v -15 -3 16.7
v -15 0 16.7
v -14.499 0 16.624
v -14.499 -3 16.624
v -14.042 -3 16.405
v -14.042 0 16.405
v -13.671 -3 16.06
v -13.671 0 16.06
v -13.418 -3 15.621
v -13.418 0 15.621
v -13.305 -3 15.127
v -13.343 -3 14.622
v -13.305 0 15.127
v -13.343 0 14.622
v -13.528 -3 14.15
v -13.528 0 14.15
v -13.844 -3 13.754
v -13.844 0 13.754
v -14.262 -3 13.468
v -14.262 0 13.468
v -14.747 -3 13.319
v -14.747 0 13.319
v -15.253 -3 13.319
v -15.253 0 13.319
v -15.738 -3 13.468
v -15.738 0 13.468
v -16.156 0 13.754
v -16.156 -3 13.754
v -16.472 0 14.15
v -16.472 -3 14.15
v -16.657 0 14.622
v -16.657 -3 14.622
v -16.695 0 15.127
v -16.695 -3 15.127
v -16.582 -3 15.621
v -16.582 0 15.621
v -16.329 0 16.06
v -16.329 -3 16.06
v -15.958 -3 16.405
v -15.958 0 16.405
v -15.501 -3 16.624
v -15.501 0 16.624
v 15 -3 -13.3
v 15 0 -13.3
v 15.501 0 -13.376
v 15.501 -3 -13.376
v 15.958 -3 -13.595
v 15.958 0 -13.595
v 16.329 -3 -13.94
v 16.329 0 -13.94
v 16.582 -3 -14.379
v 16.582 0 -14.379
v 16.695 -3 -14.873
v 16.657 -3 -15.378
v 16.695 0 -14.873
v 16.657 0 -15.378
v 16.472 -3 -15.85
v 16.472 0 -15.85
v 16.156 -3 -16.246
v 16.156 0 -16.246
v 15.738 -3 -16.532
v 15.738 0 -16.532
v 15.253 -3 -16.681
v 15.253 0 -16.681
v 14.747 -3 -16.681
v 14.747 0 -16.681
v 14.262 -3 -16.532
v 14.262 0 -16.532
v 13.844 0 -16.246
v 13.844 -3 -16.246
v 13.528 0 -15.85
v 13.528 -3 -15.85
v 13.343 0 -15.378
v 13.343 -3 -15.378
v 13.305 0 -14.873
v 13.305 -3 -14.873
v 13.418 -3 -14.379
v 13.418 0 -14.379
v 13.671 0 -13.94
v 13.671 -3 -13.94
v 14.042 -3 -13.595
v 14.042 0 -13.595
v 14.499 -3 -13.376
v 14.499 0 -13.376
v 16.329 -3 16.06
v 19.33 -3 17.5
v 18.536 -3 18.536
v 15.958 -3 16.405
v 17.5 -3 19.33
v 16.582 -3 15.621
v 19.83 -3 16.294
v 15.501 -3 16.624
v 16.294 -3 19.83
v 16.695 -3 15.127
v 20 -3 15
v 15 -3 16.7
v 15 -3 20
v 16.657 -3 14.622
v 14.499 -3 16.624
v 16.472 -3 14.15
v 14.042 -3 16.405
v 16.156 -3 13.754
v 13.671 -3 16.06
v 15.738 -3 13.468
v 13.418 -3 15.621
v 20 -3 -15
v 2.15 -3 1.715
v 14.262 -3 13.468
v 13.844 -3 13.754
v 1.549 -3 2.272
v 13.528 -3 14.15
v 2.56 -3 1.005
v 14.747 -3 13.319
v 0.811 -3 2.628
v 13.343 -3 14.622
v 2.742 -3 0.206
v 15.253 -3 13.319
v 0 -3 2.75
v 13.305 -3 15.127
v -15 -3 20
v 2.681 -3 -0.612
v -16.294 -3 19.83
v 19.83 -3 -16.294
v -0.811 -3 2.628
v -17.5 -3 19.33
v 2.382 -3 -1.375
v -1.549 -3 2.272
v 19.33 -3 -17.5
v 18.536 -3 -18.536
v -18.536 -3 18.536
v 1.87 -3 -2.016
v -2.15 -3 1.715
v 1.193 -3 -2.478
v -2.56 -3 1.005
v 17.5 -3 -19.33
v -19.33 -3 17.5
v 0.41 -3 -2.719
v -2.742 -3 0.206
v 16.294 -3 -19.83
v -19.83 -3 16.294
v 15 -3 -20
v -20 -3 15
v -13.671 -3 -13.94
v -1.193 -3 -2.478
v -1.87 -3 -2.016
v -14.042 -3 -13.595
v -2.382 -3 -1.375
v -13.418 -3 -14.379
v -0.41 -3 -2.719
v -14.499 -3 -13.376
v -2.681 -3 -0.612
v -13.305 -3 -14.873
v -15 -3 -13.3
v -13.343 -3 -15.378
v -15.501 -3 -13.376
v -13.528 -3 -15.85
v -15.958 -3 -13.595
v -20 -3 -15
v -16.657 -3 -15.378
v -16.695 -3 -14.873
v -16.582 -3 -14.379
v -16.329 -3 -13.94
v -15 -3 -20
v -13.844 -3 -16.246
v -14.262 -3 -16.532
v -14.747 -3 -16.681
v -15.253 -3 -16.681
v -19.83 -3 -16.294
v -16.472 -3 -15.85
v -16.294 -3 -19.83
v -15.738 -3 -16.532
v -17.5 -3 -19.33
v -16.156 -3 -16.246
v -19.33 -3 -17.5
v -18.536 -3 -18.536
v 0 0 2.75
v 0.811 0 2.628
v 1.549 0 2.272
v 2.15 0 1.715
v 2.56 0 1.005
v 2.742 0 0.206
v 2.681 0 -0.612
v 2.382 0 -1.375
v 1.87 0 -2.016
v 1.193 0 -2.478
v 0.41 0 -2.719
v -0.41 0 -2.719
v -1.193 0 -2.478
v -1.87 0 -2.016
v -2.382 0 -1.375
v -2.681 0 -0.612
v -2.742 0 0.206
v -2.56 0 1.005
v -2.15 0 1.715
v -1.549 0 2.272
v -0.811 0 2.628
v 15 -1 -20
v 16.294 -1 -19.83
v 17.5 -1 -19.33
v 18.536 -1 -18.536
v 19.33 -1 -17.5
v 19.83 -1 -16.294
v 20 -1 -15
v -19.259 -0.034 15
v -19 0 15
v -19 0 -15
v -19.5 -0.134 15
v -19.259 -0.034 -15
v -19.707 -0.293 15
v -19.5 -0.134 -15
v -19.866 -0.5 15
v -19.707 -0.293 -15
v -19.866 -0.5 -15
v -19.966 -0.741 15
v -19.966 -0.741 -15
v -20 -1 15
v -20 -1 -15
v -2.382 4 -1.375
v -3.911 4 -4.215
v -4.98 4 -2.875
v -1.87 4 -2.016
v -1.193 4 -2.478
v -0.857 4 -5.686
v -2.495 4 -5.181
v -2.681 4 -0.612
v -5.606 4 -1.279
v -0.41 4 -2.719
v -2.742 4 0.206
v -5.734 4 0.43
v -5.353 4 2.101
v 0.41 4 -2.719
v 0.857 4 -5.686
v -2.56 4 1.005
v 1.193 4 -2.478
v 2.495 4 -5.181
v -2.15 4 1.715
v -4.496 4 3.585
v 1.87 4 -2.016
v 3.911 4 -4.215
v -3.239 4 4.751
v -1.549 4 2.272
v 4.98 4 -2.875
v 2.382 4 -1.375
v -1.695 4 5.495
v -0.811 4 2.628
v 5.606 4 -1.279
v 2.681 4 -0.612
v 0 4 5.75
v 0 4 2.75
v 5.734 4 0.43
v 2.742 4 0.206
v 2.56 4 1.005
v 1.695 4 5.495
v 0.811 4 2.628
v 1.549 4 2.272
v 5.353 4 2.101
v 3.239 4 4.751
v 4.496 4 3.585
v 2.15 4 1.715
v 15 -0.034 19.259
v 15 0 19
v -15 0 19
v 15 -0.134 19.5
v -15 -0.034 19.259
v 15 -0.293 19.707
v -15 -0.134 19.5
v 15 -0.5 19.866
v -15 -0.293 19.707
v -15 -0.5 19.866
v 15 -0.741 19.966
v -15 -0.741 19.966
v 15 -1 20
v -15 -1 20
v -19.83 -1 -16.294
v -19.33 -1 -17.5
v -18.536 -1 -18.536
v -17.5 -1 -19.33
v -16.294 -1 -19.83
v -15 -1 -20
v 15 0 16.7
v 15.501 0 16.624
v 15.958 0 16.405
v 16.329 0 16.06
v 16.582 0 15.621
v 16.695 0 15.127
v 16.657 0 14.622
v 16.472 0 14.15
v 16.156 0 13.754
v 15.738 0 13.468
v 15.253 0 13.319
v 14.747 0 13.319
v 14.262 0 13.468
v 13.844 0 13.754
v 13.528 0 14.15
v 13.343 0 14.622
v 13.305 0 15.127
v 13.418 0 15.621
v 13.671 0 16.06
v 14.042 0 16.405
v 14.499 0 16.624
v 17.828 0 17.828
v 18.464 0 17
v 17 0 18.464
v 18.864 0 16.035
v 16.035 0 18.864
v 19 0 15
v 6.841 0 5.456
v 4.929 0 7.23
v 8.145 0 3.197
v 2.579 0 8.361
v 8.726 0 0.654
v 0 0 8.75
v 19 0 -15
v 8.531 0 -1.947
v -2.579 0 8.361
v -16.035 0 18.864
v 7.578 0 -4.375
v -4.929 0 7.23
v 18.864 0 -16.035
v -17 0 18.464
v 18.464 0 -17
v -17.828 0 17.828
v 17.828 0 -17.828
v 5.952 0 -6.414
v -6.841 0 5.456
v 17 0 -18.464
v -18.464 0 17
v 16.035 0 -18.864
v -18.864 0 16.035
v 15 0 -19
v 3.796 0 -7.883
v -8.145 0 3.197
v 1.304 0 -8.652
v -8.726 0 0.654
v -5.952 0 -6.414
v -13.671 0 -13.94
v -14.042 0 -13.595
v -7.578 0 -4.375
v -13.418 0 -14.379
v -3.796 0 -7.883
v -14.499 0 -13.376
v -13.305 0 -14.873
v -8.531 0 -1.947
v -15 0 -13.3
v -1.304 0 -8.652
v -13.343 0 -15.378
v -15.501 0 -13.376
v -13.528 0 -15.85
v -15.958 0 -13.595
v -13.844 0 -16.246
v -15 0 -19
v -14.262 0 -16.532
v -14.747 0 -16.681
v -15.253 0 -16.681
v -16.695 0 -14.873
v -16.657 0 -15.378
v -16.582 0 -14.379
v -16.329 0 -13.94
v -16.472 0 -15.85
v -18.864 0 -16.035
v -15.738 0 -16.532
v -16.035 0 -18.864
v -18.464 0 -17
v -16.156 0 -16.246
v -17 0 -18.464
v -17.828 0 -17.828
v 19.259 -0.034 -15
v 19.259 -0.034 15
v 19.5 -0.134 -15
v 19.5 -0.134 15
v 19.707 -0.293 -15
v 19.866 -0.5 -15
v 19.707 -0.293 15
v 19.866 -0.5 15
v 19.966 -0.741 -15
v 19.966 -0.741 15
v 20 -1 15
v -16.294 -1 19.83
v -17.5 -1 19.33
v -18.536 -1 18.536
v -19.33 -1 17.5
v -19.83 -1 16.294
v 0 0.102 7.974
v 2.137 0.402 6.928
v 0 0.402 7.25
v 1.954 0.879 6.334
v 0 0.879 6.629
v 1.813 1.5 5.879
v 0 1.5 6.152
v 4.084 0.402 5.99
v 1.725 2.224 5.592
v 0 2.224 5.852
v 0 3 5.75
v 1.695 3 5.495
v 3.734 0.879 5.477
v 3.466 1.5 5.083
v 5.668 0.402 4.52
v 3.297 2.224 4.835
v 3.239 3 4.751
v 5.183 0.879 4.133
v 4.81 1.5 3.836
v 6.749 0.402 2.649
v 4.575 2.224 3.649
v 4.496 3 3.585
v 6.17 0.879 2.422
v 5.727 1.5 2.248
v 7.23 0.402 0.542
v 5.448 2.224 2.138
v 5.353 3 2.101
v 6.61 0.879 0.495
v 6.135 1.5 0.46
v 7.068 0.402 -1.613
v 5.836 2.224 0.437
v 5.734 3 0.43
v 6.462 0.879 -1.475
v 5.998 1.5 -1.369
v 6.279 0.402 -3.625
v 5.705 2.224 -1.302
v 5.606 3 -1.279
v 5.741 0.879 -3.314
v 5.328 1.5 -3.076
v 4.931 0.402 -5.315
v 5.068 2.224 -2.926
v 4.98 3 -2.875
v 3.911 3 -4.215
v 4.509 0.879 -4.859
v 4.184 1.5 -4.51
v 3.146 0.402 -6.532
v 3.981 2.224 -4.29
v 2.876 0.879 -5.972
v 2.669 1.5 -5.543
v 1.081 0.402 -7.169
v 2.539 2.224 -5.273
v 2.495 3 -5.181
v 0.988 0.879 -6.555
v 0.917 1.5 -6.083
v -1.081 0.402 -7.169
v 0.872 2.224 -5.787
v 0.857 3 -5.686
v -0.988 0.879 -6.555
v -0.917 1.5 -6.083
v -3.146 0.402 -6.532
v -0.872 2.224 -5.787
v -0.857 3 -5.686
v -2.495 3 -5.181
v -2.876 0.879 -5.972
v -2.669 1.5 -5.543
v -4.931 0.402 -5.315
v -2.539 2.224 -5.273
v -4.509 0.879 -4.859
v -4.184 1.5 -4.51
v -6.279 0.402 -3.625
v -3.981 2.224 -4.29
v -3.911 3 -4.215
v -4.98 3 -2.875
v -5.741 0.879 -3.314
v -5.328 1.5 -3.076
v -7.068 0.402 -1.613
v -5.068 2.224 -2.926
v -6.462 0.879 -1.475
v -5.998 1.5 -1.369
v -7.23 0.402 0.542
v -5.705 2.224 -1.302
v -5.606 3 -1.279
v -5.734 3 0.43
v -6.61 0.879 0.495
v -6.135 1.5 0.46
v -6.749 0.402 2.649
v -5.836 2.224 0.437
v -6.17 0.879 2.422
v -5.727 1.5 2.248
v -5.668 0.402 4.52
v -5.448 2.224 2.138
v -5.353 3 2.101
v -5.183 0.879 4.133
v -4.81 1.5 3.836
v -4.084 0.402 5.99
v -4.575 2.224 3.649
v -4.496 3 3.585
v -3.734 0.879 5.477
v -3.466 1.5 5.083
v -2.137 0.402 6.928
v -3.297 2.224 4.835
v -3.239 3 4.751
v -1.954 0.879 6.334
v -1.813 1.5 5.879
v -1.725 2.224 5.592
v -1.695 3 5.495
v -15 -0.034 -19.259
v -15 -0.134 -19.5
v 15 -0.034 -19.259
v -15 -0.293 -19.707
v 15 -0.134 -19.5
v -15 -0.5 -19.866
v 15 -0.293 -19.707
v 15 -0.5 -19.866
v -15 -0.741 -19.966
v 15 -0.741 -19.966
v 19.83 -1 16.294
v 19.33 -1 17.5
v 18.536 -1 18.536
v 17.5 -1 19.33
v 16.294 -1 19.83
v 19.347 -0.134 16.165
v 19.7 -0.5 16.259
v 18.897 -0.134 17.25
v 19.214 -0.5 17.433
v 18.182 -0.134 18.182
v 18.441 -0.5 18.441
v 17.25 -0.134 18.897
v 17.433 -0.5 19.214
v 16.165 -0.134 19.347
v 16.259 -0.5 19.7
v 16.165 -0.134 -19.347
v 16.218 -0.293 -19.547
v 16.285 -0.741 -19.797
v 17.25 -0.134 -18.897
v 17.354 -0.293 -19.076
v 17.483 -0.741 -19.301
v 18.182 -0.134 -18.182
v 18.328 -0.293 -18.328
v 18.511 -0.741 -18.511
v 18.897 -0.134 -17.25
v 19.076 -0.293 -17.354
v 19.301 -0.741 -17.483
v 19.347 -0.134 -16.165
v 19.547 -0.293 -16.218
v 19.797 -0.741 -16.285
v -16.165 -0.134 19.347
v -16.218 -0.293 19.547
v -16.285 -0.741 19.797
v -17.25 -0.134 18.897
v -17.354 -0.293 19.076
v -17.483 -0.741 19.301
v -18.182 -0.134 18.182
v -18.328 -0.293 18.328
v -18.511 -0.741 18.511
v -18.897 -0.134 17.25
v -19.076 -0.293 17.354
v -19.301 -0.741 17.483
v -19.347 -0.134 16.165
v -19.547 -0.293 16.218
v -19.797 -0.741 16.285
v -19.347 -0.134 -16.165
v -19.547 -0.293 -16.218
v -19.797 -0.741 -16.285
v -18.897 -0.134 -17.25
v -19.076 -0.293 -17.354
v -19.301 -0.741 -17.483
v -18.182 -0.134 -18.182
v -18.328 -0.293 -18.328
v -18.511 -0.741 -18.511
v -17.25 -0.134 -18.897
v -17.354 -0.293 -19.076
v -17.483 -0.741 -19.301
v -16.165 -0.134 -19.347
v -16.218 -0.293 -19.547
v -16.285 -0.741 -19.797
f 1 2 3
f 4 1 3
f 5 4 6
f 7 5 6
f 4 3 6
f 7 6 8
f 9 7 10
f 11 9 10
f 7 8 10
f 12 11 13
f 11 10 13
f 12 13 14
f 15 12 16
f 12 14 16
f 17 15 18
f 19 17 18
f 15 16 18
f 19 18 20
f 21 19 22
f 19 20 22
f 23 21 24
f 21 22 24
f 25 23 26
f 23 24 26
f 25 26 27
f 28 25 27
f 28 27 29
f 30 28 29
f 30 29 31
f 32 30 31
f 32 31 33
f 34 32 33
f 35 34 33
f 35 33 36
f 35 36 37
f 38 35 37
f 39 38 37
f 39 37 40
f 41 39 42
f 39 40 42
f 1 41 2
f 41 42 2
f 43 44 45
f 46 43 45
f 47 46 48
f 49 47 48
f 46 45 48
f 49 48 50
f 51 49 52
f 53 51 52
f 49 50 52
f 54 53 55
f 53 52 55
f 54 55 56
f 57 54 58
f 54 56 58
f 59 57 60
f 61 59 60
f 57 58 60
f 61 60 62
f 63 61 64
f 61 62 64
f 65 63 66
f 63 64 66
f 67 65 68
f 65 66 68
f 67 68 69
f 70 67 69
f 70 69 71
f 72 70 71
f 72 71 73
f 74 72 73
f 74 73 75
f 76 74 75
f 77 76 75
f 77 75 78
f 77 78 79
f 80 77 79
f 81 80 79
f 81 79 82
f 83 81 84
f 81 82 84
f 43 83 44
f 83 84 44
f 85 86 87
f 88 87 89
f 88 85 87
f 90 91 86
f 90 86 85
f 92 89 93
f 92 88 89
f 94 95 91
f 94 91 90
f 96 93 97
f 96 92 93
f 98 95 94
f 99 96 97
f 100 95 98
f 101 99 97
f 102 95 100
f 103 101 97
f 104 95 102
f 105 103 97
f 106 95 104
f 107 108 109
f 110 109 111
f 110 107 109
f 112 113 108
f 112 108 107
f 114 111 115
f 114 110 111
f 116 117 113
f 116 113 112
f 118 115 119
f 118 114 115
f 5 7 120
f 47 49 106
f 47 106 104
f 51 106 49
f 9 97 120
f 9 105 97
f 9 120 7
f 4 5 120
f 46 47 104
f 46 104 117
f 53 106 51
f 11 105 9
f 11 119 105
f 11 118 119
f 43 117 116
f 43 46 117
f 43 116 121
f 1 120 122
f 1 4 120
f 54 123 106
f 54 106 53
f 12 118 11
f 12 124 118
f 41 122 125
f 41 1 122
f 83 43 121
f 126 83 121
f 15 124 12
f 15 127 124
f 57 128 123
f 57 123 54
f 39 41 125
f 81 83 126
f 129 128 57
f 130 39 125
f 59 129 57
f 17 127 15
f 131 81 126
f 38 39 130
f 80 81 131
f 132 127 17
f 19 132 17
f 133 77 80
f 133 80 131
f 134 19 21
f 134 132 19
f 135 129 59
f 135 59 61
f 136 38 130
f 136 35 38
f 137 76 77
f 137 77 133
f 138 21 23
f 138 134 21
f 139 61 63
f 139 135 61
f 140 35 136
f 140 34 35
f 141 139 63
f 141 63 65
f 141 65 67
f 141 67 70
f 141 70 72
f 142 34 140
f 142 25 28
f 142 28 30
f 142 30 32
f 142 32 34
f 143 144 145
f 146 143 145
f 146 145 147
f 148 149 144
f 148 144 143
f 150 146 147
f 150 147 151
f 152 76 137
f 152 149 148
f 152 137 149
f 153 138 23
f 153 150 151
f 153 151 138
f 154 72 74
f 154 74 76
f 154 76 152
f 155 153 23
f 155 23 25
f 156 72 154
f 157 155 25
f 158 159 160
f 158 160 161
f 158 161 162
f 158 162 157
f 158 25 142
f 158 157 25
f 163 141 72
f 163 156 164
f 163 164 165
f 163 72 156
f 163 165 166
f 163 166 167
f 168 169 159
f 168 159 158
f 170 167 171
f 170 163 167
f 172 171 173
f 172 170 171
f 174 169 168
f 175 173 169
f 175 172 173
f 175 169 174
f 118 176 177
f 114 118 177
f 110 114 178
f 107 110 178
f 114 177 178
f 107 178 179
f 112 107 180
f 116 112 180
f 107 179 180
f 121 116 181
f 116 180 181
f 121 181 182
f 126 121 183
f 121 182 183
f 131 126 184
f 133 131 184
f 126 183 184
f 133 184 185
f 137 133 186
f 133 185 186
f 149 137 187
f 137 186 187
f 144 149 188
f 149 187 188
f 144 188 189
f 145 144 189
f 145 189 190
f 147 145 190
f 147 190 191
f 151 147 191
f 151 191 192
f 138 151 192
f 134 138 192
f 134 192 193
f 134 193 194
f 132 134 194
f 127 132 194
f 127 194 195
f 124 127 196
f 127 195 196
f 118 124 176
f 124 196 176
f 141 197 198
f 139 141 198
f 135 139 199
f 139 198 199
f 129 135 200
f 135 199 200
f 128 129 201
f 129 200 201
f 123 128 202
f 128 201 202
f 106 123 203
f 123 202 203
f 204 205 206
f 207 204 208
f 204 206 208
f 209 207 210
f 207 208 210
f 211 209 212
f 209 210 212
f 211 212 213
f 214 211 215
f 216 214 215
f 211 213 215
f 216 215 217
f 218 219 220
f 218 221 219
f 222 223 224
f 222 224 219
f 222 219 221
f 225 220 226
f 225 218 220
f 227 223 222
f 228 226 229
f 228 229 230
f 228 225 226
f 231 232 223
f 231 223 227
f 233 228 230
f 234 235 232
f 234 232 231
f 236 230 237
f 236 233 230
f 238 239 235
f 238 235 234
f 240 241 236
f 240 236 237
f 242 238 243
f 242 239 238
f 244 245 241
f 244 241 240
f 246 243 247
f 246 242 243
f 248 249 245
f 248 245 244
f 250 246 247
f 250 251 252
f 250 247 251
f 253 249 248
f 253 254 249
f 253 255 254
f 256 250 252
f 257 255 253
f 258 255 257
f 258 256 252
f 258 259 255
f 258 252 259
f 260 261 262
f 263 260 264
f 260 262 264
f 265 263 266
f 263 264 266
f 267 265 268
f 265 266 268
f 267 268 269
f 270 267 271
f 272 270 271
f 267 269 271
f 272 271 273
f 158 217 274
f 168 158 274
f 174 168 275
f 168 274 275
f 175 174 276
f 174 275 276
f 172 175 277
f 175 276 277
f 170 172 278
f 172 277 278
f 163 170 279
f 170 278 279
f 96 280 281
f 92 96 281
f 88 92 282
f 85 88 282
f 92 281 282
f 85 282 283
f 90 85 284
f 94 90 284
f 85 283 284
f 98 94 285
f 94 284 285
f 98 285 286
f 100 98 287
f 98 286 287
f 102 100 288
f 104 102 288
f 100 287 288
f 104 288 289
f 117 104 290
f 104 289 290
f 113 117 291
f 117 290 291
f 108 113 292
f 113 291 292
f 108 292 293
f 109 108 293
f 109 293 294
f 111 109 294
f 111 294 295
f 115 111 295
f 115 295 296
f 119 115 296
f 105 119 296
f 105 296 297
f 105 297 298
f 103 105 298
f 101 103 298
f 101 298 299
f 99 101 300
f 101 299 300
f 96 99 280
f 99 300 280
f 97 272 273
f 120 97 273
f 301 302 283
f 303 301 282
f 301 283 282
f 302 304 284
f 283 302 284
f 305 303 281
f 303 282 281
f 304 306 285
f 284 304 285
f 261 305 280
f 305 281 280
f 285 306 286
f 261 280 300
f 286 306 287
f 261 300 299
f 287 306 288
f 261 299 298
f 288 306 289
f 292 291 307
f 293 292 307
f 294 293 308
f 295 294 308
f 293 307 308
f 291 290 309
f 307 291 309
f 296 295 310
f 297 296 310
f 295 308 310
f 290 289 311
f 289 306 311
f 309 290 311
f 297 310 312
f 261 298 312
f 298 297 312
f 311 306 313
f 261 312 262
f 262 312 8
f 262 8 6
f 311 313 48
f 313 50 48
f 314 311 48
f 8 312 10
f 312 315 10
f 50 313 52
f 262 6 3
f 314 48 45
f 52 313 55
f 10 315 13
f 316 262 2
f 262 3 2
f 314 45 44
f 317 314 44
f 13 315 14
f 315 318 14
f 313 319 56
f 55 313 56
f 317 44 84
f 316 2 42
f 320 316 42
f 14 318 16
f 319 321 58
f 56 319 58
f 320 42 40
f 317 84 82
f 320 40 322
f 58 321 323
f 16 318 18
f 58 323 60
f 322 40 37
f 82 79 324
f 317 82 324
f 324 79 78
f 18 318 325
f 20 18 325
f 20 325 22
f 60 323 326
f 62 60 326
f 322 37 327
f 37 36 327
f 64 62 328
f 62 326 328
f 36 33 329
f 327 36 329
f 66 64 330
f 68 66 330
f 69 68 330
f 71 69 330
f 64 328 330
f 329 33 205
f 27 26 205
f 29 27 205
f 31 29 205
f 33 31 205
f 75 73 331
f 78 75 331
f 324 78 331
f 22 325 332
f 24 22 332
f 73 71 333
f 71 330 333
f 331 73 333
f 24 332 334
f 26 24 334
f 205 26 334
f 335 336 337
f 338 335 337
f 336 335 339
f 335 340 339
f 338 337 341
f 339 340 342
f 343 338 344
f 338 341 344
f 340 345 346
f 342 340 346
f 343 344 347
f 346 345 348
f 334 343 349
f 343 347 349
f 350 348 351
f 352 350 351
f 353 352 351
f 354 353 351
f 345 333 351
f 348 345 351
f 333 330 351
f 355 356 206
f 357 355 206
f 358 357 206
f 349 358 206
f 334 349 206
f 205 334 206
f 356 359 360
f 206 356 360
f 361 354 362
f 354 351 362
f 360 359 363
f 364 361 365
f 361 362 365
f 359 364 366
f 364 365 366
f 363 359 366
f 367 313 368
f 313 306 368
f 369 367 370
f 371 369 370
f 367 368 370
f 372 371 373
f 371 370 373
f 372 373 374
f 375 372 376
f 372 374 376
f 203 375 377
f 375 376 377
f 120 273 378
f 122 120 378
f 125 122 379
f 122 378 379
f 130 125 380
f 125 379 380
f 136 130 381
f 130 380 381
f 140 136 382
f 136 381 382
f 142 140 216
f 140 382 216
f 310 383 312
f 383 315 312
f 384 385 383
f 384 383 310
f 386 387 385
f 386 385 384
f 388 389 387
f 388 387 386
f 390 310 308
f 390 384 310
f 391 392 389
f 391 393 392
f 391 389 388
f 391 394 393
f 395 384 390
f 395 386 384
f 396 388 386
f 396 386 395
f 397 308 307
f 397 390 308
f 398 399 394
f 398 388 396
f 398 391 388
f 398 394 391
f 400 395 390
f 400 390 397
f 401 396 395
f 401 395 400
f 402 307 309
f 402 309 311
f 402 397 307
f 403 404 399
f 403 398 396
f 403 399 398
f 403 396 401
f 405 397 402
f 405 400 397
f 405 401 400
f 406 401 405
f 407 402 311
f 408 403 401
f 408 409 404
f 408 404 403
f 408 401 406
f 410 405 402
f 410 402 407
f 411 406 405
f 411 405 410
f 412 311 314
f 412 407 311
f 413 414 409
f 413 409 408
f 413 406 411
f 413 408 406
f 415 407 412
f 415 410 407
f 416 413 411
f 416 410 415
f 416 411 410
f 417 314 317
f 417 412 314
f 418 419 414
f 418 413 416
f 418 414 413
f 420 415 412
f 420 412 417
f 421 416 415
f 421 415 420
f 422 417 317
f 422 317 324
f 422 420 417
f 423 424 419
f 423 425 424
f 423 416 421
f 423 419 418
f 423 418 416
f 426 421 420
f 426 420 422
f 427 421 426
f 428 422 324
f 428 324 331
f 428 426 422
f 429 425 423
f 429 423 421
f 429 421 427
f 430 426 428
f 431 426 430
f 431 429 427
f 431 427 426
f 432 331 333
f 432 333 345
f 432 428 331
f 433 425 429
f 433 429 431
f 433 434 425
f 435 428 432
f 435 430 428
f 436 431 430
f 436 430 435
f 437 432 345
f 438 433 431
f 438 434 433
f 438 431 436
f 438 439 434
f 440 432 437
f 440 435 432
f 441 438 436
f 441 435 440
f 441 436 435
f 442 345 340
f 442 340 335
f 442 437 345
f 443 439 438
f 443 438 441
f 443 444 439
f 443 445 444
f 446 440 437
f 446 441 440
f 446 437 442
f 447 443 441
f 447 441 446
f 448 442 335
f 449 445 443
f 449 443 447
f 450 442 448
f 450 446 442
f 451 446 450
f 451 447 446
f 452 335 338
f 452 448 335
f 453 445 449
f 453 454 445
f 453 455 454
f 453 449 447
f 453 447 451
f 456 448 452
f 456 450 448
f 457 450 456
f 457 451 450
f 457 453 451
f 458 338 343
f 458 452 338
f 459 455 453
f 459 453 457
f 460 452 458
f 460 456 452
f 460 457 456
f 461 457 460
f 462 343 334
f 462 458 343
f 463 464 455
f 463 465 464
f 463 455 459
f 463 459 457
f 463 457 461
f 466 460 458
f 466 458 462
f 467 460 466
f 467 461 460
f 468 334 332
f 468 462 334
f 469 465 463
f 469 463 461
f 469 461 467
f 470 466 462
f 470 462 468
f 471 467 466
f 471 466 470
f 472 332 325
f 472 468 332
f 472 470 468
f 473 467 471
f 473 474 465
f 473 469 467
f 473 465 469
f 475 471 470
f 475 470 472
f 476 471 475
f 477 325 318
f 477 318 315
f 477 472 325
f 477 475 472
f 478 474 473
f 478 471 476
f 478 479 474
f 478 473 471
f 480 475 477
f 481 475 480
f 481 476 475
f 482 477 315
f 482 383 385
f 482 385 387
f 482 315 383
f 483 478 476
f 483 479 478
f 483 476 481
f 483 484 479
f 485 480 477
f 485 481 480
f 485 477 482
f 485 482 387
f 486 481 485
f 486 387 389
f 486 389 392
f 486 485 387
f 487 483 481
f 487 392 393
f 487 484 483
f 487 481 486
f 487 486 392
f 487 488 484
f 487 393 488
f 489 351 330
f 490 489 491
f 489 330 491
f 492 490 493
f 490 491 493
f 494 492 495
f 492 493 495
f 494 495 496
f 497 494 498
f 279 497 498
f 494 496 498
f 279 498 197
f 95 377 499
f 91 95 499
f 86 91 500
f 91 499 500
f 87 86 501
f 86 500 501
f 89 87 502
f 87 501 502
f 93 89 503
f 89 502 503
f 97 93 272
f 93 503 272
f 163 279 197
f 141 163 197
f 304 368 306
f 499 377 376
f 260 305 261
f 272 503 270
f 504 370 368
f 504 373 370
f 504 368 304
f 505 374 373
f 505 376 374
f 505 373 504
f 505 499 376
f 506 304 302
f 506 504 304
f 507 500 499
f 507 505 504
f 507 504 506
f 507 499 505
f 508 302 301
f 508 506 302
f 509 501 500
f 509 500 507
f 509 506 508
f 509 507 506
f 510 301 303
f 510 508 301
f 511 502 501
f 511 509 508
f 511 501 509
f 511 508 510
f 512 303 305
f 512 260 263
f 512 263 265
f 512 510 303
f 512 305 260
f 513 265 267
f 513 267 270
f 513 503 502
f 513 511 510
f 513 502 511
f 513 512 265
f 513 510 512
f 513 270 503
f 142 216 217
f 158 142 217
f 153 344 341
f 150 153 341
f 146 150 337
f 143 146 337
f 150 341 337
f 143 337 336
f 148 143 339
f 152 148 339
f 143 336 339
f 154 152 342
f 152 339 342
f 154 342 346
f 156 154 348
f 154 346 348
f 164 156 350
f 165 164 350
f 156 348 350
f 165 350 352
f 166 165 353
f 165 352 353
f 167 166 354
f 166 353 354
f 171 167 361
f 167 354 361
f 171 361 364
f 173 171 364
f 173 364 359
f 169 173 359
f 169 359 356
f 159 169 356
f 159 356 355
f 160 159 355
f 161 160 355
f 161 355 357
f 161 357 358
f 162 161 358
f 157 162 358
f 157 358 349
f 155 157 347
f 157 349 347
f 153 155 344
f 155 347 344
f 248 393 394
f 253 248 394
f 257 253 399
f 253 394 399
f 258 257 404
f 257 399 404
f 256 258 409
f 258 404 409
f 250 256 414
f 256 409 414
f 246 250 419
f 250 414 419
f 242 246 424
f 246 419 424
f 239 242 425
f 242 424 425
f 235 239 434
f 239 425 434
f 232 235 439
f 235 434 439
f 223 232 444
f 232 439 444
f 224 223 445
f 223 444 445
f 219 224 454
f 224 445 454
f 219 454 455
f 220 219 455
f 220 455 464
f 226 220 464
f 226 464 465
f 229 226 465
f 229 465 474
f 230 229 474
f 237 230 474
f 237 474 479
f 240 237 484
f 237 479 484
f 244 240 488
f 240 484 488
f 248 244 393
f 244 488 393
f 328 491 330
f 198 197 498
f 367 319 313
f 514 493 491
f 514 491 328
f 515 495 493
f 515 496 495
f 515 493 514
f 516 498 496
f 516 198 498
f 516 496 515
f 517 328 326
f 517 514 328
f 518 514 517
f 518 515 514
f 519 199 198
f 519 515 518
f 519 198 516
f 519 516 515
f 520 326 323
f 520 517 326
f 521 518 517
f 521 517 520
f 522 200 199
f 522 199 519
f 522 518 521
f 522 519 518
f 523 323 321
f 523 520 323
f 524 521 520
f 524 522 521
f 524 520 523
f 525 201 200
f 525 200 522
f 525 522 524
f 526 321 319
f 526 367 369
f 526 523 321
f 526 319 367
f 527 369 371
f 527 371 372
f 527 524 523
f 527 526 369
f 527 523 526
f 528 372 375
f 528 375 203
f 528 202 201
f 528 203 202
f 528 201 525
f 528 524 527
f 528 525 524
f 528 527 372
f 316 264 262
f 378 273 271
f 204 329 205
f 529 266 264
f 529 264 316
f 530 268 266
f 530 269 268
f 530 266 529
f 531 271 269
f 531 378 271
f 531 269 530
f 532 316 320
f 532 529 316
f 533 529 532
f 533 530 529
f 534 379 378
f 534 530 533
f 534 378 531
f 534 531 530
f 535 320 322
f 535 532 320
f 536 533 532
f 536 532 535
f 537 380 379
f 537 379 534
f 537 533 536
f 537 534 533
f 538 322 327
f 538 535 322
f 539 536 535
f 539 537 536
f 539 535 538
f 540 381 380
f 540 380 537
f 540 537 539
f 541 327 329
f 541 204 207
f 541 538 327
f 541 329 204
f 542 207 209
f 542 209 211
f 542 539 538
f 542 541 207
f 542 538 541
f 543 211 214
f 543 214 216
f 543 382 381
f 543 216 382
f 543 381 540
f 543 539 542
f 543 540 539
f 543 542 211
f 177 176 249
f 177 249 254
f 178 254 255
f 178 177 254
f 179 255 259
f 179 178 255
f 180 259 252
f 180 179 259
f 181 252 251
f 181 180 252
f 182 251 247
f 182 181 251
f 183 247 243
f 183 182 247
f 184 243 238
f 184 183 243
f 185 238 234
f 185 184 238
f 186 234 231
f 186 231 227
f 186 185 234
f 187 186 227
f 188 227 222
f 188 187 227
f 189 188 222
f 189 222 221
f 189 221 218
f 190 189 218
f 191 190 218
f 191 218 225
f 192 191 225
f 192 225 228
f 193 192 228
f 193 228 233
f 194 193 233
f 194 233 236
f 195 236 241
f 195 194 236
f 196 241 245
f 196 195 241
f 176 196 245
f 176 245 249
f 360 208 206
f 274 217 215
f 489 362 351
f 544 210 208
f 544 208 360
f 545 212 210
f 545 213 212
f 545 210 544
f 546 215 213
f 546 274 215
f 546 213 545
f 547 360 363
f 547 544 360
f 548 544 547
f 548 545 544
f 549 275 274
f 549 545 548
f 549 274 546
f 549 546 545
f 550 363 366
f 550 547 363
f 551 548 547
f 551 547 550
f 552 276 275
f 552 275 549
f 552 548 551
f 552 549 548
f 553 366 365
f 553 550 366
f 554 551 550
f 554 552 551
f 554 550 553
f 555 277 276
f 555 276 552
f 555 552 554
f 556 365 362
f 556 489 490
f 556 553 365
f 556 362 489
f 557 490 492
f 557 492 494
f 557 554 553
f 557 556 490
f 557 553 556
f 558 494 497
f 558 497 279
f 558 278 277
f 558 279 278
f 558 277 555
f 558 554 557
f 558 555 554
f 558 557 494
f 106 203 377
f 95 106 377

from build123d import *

# Parameters (mm, degrees)
SKETCH1_R           = 5.75
SKETCH1_R_2         = 2.75
BOSS_EXTRUDE1_DEPTH = 4
BOSS_EXTRUDE2_START = -3
SKETCH1_3_R         = 1.7
SKETCH1_3_R_2       = 2.75
BOSS_EXTRUDE2_DEPTH = 3
FILLET1_R           = 3
FILLET2_R           = 1


with BuildPart() as part:
    # Sketch1 → Boss-Extrude1 (new body)
    with BuildSketch(Plane(origin=(0, 0, 0), x_dir=(1, 0, 0), z_dir=(0, 1, 0))):
        Circle(SKETCH1_R)
        Circle(SKETCH1_R_2, mode=Mode.SUBTRACT)
    extrude(amount=BOSS_EXTRUDE1_DEPTH)

    # Sketch1<3> → Boss-Extrude2 (add)
    with BuildSketch(Plane(origin=(0, 0, 0), x_dir=(1, 0, 0), z_dir=(0, 1, 0)).offset(BOSS_EXTRUDE2_START)):
        with BuildLine():
            ThreePointArc((-20, -15), (-18.535533906, -18.535533906), (-15, -20))
            Line((-15, -20), (15, -20))
            ThreePointArc((15, -20), (18.535533906, -18.535533906), (20, -15))
            Line((20, -15), (20, 15))
            ThreePointArc((20, 15), (18.535533906, 18.535533906), (15, 20))
            Line((15, 20), (-15, 20))
            ThreePointArc((-15, 20), (-18.535533906, 18.535533906), (-20, 15))
            Line((-20, 15), (-20, -15))
        make_face()
        with Locations((-15, -15)):
            Circle(SKETCH1_3_R, mode=Mode.SUBTRACT)
        with Locations((15, -15)):
            Circle(SKETCH1_3_R, mode=Mode.SUBTRACT)
        with Locations((-15, 15)):
            Circle(SKETCH1_3_R, mode=Mode.SUBTRACT)
        with Locations((15, 15)):
            Circle(SKETCH1_3_R, mode=Mode.SUBTRACT)
        Circle(SKETCH1_3_R_2, mode=Mode.SUBTRACT)
    extrude(amount=BOSS_EXTRUDE2_DEPTH)

    # Fillet1
    fillet1_edges = [part.edges().sort_by_distance(p)[0] for p in [
        (-5.75, 0, 0),
    ]]
    fillet(fillet1_edges, radius=FILLET1_R)

    # Fillet2
    fillet2_edges = [part.edges().sort_by_distance(p)[0] for p in [
        (-18.535533906, 0, -18.535533906),
        (-20, 0, 0),
        (-18.535533906, 0, 18.535533906),
        (0, 0, 20),
        (18.535533906, 0, 18.535533906),
        (20, 0, 0),
        (18.535533906, 0, -18.535533906),
        (0, 0, -20),
    ]]
    fillet(fillet2_edges, radius=FILLET2_R)


solid = part.part
